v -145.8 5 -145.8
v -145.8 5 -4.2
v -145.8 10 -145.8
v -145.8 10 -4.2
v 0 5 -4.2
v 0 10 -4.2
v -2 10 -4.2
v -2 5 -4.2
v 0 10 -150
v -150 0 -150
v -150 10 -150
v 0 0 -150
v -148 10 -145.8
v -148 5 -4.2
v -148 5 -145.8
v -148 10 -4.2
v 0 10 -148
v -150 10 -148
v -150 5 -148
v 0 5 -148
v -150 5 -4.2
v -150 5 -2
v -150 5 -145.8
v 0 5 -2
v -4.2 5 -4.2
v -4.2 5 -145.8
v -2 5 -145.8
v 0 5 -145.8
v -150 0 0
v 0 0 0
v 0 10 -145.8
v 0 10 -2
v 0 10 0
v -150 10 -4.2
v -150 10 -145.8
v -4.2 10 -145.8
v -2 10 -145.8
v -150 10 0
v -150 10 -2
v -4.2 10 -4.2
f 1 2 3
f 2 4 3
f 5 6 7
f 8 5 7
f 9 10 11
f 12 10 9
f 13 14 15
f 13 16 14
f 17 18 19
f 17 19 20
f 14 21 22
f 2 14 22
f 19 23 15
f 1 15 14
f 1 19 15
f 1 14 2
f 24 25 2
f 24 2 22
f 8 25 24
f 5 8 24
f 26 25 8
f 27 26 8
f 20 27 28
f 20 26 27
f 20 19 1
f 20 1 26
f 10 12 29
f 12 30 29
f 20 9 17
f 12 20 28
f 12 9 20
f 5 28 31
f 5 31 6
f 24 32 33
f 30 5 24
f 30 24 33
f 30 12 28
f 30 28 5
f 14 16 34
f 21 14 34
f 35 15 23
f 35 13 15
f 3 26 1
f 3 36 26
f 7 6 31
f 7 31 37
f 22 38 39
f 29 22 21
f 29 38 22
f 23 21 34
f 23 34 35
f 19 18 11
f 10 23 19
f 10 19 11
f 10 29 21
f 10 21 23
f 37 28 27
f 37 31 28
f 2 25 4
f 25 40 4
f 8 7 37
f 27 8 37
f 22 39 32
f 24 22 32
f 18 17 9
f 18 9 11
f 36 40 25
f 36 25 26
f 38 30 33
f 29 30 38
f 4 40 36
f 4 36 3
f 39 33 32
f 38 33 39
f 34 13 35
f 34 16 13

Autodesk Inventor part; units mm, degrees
ref_plane "YZ Plane" through (0, 0, 0) normal (1, 0, 0) x (0, 1, 0)
ref_plane "XZ Plane" through (0, 0, 0) normal (0, 1, 0) x (-1, 0, 0)
ref_plane "XY Plane" through (0, 0, 0) normal (0, 0, 1) x (1, 0, 0)
sketch "Sketch1" plane through (0, 0, 0) normal (0, 1, 0) x (-1, 0, 0)
  line L0 (0, 0) -> (150, 0)
  line L1 (150, 0) -> (150, -150)
  line L2 (150, -150) -> (0, -150)
  line L3 (0, -150) -> (0, 0)
  dimension "d0" = 150
extrude "Extrusion1" add sketch "Sketch1" along normal blind 10
sketch "Sketch2" plane through (0, 10, 0) normal (0, 1, 0) x (1, 0, 0)
  line L0 (-150, 2) -> (0, 2)
  line L1 (0, 2) -> (0, 4.2)
  line L2 (0, 4.2) -> (-150, 4.2)
  line L3 (-150, 4.2) -> (-150, 2)
  line L4 (-150, 0) -> (0, 0) projected
  line L5 (-150, 150) -> (-150, 0) projected
  line L6 (-150, 75) -> (0, 75) construction
  line L7 (0, 0) -> (0, 150) projected
  line L8 (-150, 148) -> (0, 148)
  line L9 (0, 148) -> (0, 145.8)
  line L10 (0, 145.8) -> (-150, 145.8)
  line L11 (-150, 145.8) -> (-150, 148)
  line L12 (-148, 4.2) -> (-148, 145.8)
  line L13 (-145.8, 4.2) -> (-145.8, 145.8)
  line L14 (-75, 0) -> (-75, 148) construction
  line L15 (-2, 4.2) -> (-2, 145.8)
  line L16 (-4.2, 4.2) -> (-4.2, 145.8)
  point P0 (0, 148)
  dimension "d3" = 2.2
  dimension "d4" = 2
  dimension "d5" = 2.2
  dimension "d6" = 2
extrude "Extrusion2" cut sketch "Sketch2" against normal blind 5 contours L3 L2 L1 L0 | L12 L10 L13 L2 | L5 L8 L7 L10 | L2 L16 L10 L15
properties part number "base"
